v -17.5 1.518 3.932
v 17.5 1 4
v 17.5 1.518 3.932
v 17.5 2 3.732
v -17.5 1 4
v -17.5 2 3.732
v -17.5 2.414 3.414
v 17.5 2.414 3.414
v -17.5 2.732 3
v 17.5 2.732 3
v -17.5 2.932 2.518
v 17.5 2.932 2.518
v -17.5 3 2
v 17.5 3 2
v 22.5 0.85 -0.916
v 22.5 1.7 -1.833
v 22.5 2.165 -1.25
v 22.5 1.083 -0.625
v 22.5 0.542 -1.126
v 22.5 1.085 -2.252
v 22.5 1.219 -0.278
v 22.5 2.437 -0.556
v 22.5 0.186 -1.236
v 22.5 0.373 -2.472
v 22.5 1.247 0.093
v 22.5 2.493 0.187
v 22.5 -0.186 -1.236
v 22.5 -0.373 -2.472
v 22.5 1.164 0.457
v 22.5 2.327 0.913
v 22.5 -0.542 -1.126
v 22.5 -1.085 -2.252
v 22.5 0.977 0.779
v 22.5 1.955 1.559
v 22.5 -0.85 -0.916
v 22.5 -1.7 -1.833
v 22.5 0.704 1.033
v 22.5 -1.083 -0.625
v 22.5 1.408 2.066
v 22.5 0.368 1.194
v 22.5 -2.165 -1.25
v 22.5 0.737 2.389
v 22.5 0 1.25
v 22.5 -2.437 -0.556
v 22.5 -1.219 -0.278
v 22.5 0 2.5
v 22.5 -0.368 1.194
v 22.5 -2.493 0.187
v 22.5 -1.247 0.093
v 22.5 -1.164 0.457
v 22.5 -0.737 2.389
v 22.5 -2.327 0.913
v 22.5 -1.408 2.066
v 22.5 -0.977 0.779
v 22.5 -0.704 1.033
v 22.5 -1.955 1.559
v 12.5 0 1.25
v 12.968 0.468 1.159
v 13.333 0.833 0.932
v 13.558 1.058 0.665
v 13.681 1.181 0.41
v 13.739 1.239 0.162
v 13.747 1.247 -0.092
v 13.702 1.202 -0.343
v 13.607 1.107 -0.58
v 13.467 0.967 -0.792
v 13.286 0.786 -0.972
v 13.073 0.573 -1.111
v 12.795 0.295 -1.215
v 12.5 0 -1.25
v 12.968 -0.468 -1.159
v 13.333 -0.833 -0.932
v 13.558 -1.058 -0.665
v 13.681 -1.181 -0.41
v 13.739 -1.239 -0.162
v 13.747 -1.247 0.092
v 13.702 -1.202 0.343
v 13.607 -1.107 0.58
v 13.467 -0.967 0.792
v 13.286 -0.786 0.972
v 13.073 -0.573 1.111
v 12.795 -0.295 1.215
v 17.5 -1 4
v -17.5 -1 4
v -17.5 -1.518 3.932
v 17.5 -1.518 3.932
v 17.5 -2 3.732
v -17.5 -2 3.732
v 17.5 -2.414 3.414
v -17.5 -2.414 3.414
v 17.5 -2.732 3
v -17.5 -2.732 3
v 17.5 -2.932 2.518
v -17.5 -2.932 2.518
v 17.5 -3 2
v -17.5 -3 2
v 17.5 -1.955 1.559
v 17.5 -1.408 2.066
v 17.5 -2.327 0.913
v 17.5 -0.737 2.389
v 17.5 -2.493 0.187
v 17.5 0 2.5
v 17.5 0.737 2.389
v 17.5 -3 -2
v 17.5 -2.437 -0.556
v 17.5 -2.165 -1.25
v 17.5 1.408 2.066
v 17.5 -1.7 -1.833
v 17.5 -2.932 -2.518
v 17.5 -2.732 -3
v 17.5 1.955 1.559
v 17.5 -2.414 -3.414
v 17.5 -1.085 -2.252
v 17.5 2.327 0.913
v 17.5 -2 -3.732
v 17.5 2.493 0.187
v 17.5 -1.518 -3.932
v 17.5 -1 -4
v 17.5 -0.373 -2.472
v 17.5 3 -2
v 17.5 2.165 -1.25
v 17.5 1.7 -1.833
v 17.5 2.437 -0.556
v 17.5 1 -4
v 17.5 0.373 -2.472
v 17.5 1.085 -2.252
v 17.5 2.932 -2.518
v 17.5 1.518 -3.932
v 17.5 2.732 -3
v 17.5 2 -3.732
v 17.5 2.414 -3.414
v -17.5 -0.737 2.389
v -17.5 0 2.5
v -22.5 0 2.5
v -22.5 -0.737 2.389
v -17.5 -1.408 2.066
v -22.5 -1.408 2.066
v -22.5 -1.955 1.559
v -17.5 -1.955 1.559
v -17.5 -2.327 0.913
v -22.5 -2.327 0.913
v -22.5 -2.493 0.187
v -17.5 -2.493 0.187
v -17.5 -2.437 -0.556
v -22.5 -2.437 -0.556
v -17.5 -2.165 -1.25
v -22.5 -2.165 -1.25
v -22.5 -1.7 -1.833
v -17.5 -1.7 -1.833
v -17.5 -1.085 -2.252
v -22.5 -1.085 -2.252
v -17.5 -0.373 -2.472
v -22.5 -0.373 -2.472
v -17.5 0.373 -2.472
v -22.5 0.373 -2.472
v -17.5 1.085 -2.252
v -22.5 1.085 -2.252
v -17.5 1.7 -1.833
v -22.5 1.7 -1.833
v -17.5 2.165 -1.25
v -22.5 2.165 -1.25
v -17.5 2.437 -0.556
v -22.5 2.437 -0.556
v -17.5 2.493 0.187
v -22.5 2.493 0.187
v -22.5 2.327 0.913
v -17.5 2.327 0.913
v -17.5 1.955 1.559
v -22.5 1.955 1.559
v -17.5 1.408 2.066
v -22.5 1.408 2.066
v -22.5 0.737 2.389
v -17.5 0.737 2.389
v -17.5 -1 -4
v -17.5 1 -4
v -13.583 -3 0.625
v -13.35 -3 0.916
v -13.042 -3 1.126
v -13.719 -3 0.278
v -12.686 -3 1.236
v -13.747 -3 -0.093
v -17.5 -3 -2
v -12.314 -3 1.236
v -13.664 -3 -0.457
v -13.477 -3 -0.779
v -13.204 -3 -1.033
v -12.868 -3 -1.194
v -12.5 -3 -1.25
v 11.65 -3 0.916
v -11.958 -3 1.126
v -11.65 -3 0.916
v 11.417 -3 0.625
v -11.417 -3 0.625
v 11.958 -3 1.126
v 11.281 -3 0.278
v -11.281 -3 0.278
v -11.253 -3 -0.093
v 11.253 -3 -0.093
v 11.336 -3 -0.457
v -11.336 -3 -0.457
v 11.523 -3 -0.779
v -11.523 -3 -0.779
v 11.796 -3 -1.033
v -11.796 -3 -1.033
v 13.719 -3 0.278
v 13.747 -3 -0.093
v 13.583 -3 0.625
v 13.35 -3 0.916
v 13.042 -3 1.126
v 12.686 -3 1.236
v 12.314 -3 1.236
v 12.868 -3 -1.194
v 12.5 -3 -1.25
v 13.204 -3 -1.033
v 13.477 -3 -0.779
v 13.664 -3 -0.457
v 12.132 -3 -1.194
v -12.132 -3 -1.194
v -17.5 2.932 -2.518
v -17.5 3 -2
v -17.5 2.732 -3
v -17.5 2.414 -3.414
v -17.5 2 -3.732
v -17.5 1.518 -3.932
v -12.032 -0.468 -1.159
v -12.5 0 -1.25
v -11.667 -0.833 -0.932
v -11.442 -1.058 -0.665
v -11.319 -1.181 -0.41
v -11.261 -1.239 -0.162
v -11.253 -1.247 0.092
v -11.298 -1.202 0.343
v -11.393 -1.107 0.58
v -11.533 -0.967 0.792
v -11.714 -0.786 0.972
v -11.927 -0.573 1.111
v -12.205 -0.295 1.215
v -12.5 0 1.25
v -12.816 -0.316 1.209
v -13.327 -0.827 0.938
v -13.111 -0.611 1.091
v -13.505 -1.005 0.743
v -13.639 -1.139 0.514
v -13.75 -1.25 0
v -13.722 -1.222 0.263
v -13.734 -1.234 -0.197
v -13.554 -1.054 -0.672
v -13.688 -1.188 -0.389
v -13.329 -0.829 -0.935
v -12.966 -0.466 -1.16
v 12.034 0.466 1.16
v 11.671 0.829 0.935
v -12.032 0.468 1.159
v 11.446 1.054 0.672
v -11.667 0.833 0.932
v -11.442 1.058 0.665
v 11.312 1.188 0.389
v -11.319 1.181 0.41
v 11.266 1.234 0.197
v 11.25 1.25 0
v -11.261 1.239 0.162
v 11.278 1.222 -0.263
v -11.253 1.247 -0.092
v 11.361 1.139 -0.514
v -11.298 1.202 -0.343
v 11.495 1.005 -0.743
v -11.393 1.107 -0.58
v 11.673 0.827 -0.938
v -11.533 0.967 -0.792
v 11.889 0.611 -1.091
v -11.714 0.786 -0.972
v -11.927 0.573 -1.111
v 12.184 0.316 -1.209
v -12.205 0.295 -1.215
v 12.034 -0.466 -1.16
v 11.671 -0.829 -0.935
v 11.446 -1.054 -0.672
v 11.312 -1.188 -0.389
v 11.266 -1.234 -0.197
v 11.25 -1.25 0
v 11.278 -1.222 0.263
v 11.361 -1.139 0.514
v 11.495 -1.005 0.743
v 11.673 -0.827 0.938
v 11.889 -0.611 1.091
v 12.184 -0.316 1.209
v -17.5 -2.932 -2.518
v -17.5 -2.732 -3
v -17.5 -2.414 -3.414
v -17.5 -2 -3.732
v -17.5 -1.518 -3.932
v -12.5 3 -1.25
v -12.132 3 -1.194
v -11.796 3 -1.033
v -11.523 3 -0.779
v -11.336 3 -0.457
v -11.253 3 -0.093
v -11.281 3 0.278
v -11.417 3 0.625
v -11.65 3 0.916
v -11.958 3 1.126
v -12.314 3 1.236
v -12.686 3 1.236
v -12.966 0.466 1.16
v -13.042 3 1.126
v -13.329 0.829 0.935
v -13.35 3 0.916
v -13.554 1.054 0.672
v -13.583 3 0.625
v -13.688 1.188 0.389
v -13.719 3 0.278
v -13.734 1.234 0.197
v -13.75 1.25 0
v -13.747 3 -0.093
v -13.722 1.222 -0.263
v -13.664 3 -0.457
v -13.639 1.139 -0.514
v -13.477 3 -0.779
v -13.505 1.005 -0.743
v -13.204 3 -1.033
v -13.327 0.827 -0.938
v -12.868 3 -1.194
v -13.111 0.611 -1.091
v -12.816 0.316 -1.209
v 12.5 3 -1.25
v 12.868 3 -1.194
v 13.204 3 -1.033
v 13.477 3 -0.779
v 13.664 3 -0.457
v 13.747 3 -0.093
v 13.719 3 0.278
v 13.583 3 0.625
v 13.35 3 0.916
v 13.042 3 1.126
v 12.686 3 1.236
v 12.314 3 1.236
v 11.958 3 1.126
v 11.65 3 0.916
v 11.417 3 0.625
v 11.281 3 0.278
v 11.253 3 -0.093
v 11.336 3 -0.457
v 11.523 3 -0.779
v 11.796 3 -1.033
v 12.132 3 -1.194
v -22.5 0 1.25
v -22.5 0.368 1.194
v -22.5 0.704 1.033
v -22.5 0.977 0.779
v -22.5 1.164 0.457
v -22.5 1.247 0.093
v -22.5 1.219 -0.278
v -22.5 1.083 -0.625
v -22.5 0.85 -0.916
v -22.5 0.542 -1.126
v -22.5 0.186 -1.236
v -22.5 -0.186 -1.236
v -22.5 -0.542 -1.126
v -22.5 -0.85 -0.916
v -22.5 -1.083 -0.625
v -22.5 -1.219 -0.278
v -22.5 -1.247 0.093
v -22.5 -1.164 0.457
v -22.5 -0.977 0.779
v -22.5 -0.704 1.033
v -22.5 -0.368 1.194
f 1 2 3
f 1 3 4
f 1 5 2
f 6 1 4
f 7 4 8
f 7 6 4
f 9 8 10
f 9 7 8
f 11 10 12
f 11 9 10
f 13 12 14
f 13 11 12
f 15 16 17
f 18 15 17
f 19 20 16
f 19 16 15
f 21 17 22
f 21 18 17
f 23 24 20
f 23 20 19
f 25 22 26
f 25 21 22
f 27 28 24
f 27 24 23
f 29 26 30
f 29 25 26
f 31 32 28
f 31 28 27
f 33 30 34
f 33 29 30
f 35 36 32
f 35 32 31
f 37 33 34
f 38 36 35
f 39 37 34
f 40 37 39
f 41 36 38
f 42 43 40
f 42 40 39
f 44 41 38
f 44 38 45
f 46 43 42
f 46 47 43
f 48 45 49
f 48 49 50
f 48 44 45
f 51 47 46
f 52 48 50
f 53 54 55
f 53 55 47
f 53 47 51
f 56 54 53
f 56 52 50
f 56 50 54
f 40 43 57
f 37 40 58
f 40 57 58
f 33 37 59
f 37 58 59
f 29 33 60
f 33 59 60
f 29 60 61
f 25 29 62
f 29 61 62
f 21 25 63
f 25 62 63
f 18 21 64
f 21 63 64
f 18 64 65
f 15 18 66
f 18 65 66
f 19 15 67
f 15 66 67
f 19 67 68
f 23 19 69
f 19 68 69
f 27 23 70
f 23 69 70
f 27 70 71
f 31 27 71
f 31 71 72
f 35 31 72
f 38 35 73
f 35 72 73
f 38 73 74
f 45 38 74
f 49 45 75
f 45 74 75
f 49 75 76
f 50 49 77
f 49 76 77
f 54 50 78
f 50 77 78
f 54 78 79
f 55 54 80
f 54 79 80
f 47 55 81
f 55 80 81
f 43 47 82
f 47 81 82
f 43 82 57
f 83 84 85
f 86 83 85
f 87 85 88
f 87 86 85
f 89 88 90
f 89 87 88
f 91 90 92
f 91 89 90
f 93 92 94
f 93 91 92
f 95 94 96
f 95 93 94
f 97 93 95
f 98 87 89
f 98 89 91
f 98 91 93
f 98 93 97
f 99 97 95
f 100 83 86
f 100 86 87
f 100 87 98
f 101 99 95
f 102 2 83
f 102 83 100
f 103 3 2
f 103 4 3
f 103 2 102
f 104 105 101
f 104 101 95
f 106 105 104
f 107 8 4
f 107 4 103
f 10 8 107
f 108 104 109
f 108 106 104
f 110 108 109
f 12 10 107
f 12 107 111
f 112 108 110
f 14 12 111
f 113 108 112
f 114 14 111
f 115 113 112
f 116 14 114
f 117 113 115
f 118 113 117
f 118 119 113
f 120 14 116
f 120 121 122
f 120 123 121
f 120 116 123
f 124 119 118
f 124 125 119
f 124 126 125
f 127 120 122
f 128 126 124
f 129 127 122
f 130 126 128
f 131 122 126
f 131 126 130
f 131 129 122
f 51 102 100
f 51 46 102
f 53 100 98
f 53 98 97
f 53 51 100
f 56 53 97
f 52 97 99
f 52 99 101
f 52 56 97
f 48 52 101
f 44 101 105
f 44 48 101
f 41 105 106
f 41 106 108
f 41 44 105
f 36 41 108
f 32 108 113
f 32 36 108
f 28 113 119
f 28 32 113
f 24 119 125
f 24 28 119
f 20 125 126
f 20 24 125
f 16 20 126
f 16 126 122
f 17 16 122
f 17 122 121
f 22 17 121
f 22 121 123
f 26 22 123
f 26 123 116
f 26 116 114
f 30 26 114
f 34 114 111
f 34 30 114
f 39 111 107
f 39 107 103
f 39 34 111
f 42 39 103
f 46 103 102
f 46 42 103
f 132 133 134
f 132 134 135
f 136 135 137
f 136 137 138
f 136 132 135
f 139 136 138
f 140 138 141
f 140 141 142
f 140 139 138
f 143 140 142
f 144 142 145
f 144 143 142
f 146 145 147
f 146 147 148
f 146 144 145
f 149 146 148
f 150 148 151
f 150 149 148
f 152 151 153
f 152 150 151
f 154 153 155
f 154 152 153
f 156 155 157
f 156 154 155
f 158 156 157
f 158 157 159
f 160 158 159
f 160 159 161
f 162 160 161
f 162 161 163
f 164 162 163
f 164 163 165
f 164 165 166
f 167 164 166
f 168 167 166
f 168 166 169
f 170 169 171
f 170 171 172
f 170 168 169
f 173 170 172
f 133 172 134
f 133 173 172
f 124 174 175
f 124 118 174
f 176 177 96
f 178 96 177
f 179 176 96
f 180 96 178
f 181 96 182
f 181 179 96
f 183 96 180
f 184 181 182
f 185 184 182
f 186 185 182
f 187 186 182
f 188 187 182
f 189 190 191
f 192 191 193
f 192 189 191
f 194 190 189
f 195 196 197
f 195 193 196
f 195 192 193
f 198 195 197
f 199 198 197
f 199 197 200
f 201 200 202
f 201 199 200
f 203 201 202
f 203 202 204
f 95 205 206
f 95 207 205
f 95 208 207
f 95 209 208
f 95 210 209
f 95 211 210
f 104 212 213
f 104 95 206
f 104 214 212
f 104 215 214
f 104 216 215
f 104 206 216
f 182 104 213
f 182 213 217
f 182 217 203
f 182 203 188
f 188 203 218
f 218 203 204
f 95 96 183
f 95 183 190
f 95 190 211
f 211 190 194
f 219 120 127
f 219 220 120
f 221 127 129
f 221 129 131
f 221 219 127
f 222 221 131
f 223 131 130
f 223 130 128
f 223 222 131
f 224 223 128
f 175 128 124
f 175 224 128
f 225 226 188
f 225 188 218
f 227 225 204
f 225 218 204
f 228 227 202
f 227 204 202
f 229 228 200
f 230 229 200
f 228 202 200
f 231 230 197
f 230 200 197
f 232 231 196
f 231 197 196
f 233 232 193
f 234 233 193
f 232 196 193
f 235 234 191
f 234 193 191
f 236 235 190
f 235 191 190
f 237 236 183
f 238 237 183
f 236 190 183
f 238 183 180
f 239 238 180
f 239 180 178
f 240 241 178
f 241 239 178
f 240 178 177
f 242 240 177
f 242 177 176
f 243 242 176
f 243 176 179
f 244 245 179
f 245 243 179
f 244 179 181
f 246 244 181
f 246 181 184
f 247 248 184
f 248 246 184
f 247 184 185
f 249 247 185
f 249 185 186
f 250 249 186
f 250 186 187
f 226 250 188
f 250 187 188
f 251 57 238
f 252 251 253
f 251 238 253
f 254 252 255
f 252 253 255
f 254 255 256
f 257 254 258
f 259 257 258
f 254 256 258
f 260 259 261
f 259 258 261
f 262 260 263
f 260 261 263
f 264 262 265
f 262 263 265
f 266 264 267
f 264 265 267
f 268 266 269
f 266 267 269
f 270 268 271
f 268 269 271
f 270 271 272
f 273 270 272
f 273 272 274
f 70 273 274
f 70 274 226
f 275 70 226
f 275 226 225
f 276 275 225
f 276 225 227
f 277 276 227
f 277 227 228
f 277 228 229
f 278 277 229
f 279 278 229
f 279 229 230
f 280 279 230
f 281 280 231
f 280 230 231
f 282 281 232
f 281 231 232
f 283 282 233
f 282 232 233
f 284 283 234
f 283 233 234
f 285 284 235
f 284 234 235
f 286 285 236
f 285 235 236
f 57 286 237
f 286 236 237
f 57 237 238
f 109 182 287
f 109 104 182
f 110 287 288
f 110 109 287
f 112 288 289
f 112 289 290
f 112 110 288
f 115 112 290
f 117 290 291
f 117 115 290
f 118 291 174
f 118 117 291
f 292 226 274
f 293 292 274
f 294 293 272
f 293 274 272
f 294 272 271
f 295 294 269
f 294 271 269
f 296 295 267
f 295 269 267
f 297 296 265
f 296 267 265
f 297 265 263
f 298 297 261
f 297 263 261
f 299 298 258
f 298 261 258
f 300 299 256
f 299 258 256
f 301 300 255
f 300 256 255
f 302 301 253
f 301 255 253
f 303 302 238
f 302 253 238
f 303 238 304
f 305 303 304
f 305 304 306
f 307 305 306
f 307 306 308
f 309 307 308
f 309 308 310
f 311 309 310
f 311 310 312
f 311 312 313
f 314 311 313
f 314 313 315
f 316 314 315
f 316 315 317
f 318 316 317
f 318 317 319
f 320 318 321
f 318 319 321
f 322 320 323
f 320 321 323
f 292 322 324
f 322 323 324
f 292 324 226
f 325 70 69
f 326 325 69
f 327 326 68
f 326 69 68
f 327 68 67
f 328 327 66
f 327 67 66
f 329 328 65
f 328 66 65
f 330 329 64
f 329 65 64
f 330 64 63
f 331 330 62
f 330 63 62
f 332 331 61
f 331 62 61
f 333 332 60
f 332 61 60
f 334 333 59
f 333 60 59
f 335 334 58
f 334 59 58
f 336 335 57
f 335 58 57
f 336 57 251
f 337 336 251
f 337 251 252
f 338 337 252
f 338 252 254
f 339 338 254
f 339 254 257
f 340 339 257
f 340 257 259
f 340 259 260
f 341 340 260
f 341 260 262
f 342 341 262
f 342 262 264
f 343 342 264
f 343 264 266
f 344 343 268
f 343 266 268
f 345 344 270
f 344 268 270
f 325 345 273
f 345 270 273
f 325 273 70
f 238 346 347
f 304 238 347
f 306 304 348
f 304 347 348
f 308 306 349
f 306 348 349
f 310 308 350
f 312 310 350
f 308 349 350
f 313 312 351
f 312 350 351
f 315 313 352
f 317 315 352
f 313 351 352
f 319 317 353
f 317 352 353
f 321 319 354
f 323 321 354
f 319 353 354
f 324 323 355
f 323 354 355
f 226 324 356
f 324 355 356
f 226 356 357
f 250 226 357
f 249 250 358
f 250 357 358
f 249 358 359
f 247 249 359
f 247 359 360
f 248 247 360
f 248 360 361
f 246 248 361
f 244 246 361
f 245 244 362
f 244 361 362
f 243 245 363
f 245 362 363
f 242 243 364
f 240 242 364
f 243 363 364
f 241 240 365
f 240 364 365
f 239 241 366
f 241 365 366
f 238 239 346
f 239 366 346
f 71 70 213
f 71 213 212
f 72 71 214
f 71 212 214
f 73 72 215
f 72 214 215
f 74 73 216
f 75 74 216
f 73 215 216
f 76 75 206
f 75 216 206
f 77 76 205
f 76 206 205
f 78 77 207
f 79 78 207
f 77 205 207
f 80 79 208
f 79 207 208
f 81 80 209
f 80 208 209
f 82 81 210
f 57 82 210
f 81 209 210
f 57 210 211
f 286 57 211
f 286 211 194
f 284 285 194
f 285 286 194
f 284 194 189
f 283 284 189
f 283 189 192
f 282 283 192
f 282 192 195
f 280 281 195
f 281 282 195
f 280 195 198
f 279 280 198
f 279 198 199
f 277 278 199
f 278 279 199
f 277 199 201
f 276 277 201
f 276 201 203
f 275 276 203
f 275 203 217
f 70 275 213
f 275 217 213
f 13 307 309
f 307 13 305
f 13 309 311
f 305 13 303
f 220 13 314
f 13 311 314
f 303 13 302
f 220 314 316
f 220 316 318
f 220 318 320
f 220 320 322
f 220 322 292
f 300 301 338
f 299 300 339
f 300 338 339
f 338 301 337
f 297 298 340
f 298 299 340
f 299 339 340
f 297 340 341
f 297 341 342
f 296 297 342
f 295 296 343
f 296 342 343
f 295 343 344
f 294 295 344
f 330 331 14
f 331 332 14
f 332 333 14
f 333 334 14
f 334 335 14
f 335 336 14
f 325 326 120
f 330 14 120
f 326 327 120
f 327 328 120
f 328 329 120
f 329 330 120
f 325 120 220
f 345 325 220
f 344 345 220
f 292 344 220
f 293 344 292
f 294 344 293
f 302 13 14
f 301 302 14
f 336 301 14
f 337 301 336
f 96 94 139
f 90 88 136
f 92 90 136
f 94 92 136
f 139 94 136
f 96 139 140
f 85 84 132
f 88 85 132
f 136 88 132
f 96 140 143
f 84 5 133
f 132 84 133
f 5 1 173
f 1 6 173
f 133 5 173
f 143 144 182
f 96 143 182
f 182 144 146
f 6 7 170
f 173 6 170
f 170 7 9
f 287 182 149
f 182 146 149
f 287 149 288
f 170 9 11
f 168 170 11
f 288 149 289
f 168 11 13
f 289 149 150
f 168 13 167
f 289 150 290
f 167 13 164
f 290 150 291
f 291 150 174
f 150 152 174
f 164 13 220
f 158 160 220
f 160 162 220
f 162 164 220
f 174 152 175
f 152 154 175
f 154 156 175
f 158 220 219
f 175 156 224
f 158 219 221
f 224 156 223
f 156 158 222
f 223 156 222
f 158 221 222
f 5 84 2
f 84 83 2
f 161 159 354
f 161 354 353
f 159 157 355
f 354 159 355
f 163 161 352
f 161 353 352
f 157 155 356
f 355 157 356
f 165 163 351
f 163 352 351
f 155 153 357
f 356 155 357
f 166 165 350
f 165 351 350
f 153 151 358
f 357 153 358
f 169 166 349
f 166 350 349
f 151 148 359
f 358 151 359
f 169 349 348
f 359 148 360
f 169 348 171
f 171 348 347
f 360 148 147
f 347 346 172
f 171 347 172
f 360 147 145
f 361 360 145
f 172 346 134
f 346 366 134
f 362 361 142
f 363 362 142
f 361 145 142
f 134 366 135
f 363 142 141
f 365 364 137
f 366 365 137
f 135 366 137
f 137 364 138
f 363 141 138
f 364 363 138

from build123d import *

# Parameters (mm, degrees)
SKETCH_1_W          = 8
SKETCH_1_H          = 6
EXTRUDE_1_DEPTH     = 17.5
SKETCH_2_R          = 2.5
EXTRUDE_2_DEPTH     = 22.5
FILLET_1_R          = 2
HOLE_WIZARD_M3_1_D  = 2.5
SKETCH_6_R          = 1
CUT_EXTRUDE_1_DEPTH = 24.627314701
HOLE_WIZARD_M3_2_D  = 2.5


with BuildPart() as part:
    # 草圖1 → 填料-伸長1 (new, symmetric)
    with BuildSketch(Plane(origin=(0, 0, 0), x_dir=(0, 0, -1), z_dir=(1, 0, 0))):
        Rectangle(SKETCH_1_W, SKETCH_1_H)
    extrude(amount=EXTRUDE_1_DEPTH, both=True)

    # 草圖2 → 填料-伸長2 (add, symmetric)
    with BuildSketch(Plane(origin=(0, 0, 0), x_dir=(0, 0, -1), z_dir=(1, 0, 0))):
        with Locations(Location((0, 0, 0), (0, 0, 180))):
            Circle(SKETCH_2_R)
    extrude(amount=EXTRUDE_2_DEPTH, both=True)

    # 圓角1
    fillet_1_edges = [part.edges().sort_by_distance(p)[0] for p in [
        (0, 3, 4),
        (0, 3, -4),
        (0, -3, -4),
        (0, -3, 4),
    ]]
    fillet(fillet_1_edges, radius=FILLET_1_R)

    # M3 螺紋孔1 (through all)
    with Locations(Plane(origin=(22.5, 0, 0), x_dir=(0, 0, -1), z_dir=(1, 0, 0))):
        with Locations((0, 0)):
            Hole(HOLE_WIZARD_M3_1_D / 2)

    # 草圖6 → 除料-伸長1 (cut, through all)
    with BuildSketch(Plane(origin=(0, 3, 0), x_dir=(1, 0, 0), z_dir=(0, 1, 0))):
        with Locations(Location((-12.5, 0, 0), (0, 0, 270))):
            Circle(SKETCH_6_R)
        with Locations(Location((12.5, 0, 0), (0, 0, 270))):
            Circle(SKETCH_6_R)
    extrude(amount=-CUT_EXTRUDE_1_DEPTH, mode=Mode.SUBTRACT)

    # M3 螺紋孔2 (through all)
    with Locations(Plane(origin=(-12.5, 3, 0), x_dir=(0, 0, 1), z_dir=(0, 1, 0))):
        with Locations((0, 0), (0, 25)):
            Hole(HOLE_WIZARD_M3_2_D / 2)


solid = part.part
